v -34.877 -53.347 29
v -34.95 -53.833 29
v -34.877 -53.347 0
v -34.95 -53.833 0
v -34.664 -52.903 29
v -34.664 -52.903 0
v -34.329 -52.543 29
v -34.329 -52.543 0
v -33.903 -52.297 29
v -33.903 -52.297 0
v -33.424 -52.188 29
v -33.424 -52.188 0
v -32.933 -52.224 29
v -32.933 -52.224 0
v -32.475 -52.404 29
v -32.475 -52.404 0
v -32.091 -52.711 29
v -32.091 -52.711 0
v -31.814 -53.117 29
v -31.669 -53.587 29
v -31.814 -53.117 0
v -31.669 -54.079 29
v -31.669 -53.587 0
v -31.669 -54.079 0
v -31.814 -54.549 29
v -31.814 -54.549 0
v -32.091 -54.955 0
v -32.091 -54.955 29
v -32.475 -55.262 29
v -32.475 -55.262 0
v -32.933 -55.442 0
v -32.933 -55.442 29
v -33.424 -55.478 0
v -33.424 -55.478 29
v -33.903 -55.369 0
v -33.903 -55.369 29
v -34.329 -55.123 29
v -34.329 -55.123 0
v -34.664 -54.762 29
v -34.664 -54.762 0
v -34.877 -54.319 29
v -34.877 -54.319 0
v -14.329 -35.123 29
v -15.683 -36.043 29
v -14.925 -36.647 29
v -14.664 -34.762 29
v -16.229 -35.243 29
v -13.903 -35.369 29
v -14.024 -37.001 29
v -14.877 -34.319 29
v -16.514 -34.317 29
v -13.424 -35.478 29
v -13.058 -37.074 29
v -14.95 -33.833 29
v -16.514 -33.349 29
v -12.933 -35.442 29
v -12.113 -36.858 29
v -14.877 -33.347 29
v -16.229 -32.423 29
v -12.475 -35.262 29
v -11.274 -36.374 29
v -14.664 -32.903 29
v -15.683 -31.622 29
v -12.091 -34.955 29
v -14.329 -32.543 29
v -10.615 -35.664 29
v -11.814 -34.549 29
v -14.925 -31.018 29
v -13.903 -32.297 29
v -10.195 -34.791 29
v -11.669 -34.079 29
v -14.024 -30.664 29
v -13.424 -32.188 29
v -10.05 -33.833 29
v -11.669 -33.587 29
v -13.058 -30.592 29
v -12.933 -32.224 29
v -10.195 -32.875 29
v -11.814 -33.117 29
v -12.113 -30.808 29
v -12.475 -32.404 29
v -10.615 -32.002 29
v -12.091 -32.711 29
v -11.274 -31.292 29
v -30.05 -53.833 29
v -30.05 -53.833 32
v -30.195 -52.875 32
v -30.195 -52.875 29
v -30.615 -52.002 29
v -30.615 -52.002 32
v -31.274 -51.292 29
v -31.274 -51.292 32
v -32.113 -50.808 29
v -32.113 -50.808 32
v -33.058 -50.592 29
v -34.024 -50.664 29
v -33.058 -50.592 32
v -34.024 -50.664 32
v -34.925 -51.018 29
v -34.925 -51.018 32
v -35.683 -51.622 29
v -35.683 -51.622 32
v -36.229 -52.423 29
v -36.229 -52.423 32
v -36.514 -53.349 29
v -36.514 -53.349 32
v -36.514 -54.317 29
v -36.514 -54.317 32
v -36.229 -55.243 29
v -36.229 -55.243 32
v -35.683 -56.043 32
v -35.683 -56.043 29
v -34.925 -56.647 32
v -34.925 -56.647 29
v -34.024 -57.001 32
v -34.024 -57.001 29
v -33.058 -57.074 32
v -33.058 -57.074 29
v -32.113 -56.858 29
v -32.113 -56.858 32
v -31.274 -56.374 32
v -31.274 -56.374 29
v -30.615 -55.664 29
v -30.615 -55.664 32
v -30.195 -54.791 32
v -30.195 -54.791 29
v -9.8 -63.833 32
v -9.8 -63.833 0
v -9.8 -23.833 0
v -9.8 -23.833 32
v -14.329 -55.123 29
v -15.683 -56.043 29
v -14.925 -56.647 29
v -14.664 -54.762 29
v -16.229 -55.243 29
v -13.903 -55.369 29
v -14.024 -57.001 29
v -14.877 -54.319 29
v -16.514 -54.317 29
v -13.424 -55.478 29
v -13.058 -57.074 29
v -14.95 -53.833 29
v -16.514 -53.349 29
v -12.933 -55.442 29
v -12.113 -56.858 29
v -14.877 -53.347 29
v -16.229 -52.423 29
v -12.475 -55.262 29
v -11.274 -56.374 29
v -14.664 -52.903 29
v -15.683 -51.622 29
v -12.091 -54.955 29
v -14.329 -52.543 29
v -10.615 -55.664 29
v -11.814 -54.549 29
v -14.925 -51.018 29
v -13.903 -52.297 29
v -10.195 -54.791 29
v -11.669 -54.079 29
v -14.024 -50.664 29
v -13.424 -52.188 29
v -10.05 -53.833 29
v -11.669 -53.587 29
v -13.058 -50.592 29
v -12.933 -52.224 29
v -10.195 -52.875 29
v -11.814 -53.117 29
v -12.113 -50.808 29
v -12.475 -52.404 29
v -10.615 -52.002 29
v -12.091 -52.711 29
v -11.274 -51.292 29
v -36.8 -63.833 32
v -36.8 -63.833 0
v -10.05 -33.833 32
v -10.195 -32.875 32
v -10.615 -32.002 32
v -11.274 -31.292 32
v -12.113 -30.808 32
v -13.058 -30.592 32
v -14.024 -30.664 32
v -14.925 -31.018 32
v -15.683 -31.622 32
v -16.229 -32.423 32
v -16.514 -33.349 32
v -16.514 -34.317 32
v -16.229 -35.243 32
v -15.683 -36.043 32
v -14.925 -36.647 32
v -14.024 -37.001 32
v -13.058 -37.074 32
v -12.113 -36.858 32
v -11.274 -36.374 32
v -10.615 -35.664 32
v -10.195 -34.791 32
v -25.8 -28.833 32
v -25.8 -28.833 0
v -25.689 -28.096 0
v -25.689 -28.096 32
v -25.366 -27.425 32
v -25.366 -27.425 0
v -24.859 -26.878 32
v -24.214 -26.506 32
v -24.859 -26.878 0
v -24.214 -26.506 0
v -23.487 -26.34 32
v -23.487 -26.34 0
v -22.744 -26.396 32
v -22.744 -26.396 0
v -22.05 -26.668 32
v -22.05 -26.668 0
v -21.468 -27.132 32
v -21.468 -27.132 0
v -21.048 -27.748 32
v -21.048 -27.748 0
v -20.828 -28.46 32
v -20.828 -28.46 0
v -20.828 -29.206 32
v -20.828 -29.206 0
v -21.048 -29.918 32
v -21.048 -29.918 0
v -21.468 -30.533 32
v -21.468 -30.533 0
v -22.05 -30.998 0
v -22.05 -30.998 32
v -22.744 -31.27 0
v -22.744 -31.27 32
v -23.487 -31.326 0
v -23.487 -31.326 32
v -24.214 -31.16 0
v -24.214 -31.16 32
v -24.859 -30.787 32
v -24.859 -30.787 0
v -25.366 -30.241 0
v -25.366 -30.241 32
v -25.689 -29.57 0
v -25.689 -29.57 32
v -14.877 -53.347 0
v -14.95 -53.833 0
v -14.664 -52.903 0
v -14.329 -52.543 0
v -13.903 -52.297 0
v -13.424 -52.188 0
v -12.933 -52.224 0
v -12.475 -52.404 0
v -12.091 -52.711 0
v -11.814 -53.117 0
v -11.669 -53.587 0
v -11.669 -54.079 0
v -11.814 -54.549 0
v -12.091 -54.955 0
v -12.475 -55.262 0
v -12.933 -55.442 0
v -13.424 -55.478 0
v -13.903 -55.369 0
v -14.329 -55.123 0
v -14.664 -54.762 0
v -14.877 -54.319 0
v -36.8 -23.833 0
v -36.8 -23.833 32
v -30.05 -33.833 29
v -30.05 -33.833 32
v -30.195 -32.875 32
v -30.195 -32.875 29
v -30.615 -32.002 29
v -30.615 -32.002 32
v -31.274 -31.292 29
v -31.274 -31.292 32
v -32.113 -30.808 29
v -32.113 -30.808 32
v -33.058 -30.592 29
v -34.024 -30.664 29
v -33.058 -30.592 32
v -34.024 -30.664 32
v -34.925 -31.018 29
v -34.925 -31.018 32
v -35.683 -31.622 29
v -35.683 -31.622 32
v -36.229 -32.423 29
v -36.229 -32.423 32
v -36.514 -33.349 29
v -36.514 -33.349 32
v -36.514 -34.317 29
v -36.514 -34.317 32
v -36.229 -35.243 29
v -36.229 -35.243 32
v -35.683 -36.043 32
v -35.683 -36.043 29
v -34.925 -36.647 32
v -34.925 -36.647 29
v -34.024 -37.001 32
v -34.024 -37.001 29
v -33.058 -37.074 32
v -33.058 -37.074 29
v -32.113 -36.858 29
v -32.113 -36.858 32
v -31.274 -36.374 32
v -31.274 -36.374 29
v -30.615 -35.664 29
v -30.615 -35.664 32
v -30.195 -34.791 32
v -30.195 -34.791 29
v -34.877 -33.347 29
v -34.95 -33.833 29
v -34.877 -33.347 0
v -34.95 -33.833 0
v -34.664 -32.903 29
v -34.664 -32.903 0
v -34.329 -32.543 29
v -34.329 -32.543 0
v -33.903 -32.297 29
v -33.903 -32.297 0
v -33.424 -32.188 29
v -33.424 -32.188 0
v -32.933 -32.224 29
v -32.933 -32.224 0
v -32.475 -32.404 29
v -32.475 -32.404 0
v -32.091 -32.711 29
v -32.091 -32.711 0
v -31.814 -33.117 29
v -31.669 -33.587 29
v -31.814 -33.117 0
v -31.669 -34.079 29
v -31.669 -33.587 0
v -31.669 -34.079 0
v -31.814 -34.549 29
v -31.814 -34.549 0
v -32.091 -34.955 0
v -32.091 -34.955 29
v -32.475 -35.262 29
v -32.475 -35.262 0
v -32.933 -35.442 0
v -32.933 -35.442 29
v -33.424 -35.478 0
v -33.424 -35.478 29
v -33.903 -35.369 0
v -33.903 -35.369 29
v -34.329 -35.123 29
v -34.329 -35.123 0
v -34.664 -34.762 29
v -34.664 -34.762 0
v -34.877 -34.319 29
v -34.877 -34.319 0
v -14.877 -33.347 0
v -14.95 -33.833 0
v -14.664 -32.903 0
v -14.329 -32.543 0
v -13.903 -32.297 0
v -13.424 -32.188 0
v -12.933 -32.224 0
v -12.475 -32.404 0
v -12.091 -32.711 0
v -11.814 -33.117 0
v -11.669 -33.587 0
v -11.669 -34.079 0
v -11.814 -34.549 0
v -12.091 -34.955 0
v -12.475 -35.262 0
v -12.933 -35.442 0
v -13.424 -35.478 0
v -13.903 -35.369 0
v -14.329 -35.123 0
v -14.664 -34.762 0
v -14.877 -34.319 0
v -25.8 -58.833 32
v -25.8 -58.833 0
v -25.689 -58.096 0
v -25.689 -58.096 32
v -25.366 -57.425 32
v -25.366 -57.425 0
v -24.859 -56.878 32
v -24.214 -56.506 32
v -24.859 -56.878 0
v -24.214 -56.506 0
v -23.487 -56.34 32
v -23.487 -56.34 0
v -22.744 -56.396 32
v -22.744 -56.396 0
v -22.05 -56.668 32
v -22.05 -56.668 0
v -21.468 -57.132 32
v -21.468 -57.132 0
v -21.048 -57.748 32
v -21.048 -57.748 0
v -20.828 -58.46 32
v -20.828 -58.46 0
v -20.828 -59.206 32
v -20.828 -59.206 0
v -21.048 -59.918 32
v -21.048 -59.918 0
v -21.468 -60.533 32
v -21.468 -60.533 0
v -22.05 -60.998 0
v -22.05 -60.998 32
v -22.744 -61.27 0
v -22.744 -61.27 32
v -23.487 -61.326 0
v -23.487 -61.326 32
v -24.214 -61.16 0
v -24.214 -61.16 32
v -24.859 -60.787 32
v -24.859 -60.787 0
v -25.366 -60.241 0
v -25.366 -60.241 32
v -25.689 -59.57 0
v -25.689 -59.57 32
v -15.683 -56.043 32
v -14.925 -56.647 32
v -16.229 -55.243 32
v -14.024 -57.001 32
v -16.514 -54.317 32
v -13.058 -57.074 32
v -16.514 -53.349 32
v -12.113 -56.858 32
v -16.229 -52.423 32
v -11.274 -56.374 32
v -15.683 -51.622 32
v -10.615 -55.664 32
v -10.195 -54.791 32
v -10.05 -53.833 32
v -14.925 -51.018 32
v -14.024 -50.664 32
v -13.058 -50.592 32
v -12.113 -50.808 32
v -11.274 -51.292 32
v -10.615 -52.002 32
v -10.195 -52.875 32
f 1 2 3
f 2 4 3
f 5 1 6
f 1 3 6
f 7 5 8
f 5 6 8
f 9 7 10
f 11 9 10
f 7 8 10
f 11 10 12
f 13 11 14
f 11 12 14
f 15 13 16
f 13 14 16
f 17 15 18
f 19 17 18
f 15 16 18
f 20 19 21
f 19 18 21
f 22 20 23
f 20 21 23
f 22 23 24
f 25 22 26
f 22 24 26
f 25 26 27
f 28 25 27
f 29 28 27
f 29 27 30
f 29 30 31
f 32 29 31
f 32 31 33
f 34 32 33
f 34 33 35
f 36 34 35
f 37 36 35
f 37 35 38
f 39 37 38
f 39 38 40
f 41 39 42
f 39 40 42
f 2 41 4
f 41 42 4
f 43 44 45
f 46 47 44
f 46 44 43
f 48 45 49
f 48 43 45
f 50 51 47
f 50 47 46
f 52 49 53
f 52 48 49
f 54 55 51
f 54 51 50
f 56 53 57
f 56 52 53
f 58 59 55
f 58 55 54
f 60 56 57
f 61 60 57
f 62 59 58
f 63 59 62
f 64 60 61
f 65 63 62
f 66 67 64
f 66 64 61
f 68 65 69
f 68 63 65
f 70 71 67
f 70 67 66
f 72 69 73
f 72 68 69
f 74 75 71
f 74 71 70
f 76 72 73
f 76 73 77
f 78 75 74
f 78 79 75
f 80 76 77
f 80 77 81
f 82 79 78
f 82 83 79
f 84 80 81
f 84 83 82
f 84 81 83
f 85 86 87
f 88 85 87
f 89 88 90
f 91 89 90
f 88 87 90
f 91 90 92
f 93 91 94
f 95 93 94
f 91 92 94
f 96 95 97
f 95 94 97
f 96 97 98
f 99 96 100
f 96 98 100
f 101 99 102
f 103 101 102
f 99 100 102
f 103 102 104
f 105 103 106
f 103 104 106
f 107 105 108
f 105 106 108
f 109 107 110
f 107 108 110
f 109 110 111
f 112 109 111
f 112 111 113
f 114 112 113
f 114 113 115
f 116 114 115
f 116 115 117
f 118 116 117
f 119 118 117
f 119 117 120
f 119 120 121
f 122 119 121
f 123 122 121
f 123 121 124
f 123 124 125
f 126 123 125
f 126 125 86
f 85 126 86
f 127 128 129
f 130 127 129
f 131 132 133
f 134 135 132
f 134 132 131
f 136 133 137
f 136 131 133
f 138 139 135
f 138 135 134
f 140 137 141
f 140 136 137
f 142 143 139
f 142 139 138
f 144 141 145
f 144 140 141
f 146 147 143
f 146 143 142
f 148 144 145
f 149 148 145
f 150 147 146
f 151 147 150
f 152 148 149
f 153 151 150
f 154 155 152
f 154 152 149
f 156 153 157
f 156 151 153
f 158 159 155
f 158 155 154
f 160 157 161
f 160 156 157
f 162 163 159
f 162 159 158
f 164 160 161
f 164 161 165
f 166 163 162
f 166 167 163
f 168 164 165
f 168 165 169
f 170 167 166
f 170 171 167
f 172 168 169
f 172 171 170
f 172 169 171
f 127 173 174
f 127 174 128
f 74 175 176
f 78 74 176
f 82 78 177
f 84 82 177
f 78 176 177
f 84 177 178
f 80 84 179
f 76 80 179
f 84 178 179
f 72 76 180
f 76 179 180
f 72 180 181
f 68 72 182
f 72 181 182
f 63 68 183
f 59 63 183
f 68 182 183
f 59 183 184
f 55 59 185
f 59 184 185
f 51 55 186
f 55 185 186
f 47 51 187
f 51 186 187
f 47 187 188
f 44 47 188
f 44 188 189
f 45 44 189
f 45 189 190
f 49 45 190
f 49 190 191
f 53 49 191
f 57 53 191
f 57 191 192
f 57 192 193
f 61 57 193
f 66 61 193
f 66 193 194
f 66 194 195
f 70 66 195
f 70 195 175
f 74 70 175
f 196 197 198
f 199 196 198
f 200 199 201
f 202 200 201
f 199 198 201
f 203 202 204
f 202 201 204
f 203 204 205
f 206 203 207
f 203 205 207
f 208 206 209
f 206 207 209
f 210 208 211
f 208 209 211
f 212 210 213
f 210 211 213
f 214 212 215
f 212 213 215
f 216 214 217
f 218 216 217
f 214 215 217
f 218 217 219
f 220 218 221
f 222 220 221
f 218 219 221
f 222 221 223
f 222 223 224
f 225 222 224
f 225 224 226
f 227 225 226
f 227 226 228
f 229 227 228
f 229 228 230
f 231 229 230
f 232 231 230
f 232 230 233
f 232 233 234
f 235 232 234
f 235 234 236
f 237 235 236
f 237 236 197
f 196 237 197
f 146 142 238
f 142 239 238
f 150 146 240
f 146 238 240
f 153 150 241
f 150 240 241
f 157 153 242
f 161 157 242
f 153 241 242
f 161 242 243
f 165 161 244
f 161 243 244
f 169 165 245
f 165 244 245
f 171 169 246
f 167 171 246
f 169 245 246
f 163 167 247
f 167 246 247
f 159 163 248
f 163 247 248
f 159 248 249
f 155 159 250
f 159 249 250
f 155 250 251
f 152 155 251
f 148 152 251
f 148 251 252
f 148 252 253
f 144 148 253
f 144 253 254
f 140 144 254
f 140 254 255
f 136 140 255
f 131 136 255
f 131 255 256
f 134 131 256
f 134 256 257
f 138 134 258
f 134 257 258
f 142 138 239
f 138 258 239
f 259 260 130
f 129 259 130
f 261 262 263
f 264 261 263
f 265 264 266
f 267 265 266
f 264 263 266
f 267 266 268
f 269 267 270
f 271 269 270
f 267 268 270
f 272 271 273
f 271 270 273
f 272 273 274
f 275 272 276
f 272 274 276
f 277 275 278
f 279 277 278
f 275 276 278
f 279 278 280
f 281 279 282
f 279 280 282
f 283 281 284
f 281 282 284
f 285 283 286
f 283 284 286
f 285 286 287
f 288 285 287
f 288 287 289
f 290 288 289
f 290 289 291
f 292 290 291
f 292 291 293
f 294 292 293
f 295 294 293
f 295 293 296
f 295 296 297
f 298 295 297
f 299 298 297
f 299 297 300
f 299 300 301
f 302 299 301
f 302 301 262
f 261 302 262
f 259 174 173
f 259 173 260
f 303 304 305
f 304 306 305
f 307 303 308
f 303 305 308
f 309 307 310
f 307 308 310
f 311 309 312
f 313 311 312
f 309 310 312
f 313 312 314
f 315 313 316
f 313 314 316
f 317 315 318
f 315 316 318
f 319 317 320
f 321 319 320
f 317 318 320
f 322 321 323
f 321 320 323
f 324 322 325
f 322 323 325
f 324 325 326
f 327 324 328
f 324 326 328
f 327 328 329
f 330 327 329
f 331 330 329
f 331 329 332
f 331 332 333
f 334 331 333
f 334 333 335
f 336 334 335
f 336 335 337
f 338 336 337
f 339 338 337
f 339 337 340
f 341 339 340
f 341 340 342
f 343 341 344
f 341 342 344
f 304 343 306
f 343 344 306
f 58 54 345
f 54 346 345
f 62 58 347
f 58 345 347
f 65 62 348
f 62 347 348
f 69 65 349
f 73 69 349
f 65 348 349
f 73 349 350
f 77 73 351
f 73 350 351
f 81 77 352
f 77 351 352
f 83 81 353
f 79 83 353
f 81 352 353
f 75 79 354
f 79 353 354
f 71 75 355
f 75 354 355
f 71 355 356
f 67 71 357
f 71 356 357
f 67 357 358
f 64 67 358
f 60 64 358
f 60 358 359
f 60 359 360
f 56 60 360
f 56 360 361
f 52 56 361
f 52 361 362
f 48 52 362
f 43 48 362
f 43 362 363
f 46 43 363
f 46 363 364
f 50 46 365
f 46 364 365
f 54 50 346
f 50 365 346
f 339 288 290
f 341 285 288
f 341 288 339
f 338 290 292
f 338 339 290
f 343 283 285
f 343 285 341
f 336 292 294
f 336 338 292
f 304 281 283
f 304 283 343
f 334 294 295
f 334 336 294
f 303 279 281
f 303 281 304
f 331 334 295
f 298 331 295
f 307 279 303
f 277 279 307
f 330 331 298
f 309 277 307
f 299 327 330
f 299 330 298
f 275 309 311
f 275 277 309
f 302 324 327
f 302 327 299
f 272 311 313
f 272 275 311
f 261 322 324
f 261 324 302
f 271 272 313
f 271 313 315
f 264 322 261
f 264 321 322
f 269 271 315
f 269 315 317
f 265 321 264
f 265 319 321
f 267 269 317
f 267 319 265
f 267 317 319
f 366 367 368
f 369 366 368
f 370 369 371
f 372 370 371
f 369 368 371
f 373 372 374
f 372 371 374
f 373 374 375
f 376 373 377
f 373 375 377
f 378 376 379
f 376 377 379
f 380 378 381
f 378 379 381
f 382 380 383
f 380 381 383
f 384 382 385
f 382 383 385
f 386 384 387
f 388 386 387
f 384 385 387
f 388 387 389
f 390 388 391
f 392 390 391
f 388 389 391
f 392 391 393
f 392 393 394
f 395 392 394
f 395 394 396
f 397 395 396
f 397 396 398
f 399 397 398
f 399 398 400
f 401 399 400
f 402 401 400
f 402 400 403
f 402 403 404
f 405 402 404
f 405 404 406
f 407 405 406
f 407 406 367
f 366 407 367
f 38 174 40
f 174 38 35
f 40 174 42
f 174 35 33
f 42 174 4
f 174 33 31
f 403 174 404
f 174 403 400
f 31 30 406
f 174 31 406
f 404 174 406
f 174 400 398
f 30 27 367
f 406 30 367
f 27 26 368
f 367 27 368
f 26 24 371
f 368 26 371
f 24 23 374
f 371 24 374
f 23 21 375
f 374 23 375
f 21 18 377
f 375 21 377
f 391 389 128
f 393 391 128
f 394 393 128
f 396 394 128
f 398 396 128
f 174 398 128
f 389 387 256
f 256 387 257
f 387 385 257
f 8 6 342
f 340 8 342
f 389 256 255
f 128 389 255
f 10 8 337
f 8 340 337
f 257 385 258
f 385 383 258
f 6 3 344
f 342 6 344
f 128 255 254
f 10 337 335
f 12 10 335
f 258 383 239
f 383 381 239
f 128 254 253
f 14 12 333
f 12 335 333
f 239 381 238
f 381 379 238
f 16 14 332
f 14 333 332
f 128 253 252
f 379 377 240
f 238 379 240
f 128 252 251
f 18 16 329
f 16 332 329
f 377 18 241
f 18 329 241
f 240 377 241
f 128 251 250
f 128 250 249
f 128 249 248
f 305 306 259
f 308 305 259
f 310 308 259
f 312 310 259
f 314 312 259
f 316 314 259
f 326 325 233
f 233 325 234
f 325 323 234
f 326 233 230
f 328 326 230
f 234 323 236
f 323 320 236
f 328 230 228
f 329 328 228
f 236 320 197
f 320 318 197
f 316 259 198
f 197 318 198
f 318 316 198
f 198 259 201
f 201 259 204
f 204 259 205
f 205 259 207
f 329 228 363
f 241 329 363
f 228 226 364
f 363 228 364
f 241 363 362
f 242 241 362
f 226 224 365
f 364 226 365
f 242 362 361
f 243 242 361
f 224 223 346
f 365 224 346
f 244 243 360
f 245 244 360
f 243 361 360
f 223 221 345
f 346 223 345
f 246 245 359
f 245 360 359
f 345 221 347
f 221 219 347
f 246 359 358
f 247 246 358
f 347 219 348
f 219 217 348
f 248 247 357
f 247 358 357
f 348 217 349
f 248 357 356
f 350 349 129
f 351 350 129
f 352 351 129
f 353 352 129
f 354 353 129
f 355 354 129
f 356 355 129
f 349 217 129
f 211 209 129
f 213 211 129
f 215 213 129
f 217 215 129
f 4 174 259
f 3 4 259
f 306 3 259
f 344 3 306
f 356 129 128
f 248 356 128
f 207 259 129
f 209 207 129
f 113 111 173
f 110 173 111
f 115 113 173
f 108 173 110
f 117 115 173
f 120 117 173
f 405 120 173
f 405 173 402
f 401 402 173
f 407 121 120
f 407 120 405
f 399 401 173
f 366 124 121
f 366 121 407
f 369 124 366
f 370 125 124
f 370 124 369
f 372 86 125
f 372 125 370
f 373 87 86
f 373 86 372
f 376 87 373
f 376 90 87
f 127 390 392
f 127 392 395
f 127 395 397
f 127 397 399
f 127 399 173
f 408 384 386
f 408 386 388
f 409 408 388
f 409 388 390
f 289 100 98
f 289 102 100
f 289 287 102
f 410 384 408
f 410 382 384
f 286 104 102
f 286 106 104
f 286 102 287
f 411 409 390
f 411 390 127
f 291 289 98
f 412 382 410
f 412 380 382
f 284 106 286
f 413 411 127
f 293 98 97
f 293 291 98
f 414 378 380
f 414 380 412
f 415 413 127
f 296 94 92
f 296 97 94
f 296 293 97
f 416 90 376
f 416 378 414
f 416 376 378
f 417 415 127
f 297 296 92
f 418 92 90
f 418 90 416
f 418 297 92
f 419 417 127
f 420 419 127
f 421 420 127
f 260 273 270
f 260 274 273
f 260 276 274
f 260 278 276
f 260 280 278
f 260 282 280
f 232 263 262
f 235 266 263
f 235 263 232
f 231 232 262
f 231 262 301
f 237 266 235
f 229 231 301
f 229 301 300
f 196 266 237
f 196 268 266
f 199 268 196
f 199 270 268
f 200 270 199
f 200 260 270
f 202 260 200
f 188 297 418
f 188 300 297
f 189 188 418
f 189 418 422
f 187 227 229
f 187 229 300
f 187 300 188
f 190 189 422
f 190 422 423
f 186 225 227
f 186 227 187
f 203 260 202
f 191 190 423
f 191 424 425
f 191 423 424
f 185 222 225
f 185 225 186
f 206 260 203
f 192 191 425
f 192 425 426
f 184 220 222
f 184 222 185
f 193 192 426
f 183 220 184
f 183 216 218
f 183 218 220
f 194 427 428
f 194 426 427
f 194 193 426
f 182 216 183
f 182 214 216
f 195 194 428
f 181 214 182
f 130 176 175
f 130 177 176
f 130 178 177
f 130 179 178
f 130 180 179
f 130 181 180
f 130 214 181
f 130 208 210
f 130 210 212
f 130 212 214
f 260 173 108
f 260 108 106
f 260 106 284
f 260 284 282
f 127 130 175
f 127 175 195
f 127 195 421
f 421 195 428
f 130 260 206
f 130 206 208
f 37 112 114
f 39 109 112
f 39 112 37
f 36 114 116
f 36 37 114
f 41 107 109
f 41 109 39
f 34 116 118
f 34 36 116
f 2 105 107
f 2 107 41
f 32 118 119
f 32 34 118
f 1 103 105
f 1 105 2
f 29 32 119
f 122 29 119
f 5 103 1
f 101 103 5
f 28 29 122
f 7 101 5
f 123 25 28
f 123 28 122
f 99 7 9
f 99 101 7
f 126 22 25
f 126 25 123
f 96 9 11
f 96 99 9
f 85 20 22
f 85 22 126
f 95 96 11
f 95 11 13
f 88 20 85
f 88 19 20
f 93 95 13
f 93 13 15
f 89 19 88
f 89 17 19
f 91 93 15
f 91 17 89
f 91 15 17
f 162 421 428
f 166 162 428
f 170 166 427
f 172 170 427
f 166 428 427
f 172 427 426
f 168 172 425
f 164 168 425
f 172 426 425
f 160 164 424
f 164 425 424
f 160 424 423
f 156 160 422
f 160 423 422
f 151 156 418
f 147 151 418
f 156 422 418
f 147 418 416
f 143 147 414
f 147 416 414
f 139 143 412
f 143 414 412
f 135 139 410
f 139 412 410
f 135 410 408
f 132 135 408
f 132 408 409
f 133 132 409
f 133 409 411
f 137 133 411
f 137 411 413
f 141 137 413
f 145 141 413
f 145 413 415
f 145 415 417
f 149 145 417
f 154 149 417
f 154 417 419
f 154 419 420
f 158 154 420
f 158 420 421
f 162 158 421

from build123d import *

# Parameters (mm, degrees)
F0_W           = 27
F0_H           = 40
F1_DEPTH       = 32
F3_D           = 3.3
F3_CBORE_D     = 6.5
F3_CBORE_DEPTH = 3
F4_D           = 5


with BuildPart() as f1:
    # F0 (on Top) → F1 (new body)
    with BuildSketch(Plane.XY):
        with Locations((-23.3004702032, -43.8329163194)):
            Rectangle(F0_W, F0_H)
    extrude(amount=F1_DEPTH)

    # F3 (through all)
    with Locations(Plane.XY.offset(32)):
        with Locations((-33.3004702032, -33.8329163194), (-13.3004702032, -33.8329163194), (-13.3004702032, -53.8329163194), (-33.3004702032, -53.8329163194)):
            CounterBoreHole(F3_D / 2, F3_CBORE_D / 2, F3_CBORE_DEPTH)

    # F4 (through all)
    with Locations(Plane.XY.offset(32)):
        with Locations((-23.3004702032, -28.8329163194), (-23.3004702032, -58.8329163194)):
            Hole(F4_D / 2)


solid = f1.part
